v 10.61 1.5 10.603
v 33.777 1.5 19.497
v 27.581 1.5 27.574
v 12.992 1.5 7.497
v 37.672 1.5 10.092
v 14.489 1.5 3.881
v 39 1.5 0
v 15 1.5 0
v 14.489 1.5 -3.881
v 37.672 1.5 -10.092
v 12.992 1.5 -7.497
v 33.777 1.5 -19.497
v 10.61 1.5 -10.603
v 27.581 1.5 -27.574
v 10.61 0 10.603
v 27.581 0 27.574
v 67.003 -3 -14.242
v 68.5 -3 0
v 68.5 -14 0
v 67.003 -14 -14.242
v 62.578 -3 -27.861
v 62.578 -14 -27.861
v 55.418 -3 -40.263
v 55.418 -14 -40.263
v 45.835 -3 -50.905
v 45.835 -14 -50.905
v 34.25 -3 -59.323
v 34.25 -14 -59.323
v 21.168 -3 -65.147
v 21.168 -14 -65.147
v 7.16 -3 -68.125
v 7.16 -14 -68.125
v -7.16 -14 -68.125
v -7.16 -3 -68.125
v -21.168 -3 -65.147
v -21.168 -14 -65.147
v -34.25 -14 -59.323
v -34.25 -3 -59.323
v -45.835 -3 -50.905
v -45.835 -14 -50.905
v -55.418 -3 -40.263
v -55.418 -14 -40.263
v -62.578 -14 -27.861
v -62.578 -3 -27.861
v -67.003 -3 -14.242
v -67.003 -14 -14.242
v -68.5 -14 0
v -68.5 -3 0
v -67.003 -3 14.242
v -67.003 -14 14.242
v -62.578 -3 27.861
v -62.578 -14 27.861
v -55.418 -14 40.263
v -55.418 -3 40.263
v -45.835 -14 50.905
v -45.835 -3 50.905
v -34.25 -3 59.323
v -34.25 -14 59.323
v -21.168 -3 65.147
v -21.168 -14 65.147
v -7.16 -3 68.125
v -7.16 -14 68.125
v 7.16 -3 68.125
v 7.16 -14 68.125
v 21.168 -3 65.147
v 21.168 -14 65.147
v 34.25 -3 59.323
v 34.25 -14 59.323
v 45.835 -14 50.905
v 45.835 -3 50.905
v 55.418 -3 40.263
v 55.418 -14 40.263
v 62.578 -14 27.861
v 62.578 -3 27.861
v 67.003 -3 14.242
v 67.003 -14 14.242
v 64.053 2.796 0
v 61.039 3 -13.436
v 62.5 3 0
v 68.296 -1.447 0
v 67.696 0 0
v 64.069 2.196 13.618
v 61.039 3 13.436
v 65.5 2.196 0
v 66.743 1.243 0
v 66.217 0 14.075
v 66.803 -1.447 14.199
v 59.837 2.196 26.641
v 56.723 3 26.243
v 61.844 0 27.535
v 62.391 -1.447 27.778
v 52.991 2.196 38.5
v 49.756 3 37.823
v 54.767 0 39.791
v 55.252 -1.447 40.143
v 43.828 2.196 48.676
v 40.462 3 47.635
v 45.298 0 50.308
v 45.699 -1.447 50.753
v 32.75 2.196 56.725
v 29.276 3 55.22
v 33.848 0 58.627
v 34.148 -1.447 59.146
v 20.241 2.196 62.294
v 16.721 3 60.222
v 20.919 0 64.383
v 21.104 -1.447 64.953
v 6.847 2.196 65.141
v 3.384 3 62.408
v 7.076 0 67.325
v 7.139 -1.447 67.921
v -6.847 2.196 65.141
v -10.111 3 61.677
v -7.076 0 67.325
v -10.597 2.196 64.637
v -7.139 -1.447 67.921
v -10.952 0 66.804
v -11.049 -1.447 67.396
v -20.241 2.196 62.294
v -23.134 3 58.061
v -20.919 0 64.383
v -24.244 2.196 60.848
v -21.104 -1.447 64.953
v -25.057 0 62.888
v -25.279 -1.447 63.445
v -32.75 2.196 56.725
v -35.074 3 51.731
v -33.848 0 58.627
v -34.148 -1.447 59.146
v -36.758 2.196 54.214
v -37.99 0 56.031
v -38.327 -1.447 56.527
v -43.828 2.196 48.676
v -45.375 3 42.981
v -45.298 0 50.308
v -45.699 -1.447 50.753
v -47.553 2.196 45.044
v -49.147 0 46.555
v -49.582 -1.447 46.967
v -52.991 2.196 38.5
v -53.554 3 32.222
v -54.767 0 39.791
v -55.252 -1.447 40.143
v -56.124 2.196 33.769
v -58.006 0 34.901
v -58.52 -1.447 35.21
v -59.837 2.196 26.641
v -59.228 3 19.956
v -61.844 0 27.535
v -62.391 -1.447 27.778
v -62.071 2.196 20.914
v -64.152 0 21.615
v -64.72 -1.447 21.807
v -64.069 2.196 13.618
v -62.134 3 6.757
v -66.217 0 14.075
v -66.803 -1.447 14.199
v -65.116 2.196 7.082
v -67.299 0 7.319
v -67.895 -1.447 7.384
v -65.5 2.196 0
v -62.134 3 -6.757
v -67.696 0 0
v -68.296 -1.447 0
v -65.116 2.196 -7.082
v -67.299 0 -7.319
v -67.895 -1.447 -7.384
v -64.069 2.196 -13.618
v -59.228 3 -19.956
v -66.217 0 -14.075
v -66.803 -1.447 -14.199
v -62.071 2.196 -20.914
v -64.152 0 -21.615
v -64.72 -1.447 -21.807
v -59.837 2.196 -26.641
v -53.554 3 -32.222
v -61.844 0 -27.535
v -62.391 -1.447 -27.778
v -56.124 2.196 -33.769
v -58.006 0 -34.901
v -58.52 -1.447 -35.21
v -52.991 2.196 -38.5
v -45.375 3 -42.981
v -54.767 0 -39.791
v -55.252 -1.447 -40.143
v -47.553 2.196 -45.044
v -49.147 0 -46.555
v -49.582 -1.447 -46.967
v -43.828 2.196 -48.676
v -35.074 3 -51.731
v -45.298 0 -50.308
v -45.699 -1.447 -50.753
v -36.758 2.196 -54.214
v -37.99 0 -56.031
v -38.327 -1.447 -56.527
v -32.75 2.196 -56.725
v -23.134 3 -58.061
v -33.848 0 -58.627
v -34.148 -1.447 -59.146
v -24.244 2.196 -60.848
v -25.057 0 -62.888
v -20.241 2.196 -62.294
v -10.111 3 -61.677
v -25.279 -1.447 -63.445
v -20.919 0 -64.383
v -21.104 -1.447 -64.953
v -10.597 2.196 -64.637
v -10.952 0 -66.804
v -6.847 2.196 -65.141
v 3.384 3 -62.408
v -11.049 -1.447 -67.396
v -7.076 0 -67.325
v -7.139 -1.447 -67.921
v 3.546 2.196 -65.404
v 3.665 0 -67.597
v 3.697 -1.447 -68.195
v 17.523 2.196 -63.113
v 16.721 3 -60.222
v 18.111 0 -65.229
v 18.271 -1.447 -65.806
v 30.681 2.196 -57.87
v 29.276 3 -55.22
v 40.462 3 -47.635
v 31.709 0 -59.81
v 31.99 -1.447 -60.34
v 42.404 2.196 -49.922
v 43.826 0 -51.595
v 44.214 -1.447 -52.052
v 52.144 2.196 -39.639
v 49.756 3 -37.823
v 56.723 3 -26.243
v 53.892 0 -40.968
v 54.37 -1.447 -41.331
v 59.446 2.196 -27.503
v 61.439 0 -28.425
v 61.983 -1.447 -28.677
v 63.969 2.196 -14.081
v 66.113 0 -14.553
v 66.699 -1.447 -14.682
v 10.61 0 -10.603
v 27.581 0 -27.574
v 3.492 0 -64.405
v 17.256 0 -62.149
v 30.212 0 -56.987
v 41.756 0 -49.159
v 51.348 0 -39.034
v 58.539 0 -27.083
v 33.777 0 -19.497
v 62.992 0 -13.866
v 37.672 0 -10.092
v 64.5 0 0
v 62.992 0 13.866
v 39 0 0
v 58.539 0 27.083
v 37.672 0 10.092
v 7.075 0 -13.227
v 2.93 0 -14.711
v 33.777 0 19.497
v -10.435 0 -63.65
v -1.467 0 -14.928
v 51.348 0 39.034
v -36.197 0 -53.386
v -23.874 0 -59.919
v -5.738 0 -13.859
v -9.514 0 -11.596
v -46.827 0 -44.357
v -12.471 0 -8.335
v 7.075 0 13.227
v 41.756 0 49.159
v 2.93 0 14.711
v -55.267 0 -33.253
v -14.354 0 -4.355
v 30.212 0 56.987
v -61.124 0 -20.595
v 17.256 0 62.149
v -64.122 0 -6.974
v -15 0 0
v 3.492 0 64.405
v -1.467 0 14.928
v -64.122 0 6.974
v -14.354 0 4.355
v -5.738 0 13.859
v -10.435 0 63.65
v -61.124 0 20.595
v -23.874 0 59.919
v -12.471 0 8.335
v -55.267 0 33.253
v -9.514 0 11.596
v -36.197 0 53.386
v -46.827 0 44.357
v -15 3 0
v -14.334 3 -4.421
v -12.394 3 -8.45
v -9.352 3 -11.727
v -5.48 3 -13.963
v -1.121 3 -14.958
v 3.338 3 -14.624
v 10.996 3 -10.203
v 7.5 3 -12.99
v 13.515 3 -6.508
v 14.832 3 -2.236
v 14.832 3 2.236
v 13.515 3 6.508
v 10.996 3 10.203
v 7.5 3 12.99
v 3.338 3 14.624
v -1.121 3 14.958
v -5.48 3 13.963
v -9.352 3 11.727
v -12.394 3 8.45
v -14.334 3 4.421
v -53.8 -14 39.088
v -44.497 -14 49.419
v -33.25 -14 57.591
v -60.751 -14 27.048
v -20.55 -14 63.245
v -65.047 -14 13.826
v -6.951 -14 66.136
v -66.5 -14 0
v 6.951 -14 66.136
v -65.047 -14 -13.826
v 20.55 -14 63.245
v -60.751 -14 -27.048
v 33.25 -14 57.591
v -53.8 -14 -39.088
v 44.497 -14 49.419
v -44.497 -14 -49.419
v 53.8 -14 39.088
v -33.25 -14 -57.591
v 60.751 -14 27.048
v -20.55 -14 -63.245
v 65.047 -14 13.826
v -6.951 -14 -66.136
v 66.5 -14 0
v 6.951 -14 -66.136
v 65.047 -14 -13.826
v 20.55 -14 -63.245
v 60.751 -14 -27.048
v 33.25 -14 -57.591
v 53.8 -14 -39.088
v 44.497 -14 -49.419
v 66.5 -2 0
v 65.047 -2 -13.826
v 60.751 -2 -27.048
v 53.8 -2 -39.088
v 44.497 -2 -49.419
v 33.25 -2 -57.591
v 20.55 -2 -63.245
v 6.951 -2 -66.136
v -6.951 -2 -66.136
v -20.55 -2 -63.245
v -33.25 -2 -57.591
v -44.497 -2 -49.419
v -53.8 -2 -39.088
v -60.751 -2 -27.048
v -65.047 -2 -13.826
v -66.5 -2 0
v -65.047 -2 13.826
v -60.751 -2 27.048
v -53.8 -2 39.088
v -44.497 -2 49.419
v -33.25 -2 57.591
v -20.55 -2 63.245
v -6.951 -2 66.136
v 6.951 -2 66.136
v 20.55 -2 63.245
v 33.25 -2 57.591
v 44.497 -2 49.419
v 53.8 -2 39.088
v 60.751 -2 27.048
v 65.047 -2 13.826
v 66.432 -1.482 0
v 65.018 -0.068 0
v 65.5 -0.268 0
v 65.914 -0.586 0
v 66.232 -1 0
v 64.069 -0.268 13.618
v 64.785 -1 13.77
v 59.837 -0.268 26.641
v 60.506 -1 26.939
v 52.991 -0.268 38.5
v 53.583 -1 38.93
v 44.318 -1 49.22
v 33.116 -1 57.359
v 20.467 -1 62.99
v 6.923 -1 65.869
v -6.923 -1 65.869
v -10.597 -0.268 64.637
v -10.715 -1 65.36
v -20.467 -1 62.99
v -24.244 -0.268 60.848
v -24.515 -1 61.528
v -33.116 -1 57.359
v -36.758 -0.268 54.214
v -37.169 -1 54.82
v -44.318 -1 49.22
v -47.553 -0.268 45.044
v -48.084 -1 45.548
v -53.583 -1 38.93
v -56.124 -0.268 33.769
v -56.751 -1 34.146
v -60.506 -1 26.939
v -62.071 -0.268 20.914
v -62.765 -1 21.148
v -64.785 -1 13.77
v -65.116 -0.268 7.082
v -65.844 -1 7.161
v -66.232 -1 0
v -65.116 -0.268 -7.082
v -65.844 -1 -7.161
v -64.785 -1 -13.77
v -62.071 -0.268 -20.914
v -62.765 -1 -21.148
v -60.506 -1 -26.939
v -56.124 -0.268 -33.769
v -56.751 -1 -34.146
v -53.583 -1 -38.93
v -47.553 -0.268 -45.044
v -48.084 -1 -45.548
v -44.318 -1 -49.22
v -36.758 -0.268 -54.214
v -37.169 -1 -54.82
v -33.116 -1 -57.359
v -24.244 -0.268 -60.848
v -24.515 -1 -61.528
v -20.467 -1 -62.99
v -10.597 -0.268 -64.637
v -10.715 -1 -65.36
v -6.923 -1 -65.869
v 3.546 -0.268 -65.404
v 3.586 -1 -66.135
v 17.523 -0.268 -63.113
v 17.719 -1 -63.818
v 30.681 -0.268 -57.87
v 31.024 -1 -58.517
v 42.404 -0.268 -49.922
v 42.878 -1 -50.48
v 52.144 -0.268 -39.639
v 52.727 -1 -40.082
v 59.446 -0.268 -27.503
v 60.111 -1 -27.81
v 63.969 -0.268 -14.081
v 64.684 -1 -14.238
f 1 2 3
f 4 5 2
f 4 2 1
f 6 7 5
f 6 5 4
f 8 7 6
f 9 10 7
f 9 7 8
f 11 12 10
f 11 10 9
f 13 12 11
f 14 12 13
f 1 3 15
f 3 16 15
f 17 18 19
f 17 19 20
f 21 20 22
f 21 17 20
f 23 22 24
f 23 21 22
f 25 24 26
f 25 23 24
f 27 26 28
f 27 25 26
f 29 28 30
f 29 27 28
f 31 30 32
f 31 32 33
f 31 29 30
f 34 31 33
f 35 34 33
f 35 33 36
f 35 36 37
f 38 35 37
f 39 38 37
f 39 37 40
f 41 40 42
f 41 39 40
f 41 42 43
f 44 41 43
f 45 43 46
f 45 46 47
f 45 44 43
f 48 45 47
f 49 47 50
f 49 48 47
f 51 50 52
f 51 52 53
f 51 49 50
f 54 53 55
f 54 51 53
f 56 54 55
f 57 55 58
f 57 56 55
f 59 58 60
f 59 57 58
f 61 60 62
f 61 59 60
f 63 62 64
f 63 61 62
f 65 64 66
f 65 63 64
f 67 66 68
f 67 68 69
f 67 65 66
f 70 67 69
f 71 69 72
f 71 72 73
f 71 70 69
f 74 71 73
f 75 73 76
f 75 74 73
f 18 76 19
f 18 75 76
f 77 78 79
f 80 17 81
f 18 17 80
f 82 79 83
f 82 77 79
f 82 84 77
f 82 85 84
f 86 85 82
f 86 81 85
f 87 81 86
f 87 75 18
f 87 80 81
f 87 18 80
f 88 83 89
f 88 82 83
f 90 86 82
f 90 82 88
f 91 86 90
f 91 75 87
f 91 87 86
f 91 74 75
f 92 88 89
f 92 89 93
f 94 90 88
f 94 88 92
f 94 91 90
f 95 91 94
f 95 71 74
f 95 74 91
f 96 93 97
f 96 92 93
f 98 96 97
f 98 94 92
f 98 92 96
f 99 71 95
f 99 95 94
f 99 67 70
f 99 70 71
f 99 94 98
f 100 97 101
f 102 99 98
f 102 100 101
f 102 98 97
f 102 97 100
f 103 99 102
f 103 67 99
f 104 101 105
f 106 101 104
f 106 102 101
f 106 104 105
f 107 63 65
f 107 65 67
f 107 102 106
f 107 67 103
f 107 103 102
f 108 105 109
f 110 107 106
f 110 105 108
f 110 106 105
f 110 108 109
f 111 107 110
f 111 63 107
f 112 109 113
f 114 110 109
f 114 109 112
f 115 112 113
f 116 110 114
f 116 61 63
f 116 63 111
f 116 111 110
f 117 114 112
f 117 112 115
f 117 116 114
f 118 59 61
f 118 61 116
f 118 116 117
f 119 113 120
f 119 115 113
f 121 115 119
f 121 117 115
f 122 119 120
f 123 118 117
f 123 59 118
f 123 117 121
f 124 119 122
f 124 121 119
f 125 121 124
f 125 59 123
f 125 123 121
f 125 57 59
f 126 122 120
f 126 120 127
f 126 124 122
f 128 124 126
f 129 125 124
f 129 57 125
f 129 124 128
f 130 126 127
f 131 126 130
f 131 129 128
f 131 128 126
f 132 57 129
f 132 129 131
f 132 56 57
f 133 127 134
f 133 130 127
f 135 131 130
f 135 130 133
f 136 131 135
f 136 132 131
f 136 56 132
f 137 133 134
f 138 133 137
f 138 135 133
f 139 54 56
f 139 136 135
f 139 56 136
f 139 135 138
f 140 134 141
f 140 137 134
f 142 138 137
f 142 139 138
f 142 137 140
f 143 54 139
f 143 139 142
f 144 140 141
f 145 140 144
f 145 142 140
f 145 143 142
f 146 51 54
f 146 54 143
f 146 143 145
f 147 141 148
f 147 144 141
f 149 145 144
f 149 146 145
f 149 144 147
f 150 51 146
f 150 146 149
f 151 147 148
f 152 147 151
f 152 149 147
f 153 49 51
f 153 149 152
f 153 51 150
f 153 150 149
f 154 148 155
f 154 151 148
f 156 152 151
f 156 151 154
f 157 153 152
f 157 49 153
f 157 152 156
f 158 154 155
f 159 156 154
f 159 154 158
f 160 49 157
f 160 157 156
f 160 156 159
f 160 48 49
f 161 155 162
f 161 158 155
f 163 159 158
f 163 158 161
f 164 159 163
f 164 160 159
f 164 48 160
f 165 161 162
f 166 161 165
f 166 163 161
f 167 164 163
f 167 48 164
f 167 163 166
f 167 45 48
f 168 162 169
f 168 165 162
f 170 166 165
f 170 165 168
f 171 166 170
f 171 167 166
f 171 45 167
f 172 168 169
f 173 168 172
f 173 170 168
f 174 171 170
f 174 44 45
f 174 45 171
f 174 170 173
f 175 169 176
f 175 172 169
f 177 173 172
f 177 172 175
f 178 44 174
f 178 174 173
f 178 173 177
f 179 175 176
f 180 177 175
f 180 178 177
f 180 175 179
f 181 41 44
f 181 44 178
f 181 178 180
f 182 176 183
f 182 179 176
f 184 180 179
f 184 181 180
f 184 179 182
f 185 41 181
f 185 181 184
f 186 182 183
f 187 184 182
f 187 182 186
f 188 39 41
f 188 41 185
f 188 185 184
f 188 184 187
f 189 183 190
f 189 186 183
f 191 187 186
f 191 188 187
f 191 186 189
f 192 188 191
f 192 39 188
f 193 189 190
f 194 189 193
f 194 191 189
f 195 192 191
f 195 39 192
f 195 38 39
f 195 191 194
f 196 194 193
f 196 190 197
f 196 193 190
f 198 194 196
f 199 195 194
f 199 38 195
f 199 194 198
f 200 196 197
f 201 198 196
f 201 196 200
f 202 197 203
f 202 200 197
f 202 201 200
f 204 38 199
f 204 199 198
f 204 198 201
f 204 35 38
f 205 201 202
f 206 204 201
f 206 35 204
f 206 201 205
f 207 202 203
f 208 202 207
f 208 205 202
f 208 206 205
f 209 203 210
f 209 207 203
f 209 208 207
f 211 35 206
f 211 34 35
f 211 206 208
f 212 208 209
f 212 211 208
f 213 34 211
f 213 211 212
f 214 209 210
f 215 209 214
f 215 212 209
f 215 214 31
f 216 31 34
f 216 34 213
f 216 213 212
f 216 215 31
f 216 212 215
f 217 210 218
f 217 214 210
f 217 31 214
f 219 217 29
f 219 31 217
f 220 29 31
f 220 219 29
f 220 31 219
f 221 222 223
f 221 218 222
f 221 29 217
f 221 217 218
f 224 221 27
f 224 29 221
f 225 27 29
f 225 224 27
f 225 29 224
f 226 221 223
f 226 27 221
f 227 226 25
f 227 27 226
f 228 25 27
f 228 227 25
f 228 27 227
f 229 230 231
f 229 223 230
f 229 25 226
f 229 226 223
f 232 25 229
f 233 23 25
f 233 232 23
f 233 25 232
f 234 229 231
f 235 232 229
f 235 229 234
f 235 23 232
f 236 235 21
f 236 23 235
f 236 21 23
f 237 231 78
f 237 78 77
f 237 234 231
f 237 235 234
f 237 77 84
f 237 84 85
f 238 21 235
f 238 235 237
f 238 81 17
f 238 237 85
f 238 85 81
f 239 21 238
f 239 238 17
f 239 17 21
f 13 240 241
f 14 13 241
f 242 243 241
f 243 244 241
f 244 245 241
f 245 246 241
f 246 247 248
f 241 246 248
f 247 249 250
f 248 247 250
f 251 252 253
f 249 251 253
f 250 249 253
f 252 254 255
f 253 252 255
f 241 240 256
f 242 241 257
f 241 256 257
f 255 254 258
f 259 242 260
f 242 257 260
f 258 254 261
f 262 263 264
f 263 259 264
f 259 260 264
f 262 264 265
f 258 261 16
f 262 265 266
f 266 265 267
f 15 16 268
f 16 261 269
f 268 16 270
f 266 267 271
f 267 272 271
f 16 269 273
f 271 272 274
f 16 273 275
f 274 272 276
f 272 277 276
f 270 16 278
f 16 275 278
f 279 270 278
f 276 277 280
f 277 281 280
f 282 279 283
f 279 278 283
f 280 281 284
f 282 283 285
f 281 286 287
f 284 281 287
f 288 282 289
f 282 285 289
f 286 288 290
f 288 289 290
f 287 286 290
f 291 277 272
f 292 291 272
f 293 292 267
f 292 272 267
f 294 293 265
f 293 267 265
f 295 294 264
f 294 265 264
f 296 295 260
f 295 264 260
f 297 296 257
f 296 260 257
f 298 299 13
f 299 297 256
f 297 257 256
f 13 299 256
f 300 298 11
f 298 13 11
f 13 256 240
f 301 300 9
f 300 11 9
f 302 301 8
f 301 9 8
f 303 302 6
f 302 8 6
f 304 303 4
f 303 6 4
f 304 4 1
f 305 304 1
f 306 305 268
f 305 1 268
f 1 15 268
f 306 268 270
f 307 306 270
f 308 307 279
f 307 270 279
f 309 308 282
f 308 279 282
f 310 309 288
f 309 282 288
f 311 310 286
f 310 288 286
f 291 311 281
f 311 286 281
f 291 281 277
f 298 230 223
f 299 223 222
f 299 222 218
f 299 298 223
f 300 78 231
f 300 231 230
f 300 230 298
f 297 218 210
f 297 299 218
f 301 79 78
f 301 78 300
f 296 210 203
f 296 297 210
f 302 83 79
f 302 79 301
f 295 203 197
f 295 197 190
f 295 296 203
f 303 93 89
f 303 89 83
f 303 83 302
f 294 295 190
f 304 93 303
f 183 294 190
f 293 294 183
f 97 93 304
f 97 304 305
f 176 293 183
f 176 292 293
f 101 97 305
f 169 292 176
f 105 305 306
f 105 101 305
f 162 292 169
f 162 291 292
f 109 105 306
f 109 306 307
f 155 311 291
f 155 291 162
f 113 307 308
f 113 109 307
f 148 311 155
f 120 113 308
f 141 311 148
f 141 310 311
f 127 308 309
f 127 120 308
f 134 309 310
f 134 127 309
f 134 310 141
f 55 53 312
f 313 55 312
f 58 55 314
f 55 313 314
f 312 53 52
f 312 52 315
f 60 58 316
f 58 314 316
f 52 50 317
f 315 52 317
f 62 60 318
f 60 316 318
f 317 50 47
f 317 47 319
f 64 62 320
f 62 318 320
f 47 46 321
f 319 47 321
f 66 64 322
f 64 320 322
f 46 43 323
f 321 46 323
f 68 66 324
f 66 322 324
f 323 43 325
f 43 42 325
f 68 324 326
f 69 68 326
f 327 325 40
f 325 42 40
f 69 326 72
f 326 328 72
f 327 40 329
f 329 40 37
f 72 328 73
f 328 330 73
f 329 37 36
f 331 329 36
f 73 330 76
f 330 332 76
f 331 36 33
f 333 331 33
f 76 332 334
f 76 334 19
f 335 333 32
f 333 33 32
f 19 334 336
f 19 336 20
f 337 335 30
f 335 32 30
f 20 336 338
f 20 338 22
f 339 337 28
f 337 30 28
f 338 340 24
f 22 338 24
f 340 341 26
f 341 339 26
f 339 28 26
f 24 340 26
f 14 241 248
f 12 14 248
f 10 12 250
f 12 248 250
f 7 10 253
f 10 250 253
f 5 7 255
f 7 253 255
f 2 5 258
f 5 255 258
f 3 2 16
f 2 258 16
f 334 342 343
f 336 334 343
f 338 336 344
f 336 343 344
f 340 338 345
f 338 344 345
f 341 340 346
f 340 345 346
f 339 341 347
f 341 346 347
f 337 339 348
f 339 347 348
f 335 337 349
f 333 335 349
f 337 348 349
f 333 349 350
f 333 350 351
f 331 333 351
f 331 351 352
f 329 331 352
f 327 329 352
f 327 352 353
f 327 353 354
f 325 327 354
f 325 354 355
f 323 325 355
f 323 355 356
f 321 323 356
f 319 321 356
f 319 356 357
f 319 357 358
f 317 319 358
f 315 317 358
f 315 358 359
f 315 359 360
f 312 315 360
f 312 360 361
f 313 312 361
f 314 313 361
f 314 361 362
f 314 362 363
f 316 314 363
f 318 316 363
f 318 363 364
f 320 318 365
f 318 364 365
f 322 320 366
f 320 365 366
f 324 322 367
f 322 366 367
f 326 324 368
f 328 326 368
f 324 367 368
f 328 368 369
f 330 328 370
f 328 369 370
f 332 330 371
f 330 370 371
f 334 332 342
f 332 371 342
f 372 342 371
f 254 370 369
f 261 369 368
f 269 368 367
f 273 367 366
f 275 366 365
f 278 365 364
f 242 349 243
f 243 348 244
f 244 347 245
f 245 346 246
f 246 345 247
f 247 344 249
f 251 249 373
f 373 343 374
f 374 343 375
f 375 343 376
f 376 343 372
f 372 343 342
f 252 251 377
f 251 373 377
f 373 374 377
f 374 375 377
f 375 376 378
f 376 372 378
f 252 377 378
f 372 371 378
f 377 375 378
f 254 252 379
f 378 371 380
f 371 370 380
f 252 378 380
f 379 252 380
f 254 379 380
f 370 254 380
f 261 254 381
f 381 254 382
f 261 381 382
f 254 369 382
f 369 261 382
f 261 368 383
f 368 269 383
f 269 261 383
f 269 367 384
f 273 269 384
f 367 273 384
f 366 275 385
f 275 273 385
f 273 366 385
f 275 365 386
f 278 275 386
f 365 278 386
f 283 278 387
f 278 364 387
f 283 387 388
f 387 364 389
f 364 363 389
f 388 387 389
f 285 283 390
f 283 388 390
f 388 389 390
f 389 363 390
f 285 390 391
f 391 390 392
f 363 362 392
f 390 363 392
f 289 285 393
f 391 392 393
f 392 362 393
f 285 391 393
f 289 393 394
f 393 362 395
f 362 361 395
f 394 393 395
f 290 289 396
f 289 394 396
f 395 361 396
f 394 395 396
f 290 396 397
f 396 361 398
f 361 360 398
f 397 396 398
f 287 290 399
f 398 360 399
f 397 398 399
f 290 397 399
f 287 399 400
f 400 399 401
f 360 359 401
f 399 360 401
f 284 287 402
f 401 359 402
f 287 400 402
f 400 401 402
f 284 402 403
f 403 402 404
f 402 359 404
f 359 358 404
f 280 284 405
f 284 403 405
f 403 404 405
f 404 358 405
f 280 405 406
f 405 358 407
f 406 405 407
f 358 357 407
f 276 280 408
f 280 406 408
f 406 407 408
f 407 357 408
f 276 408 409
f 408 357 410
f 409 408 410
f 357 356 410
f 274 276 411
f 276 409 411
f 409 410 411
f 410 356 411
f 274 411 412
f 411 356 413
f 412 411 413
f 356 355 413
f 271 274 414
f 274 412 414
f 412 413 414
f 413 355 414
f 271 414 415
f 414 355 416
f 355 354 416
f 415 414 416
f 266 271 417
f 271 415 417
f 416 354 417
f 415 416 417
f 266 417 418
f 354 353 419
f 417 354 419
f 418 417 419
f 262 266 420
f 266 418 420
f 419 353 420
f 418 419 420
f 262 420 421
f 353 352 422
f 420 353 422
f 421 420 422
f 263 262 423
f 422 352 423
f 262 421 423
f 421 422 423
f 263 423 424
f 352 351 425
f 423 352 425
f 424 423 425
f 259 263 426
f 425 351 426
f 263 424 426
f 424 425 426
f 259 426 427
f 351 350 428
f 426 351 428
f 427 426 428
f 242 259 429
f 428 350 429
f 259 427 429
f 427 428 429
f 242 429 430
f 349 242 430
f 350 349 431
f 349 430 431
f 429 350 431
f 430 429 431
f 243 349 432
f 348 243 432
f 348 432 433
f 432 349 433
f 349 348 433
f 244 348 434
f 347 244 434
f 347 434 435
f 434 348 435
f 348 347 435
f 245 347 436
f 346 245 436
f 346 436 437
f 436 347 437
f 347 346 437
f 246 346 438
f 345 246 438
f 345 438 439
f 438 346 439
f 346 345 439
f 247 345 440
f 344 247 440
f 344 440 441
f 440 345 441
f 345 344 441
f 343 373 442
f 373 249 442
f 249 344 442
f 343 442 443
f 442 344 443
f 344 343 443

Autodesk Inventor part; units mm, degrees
ref_plane "YZ Plane" through (0, 0, 0) normal (1, 0, 0) x (0, 1, 0)
ref_plane "XZ Plane" through (0, 0, 0) normal (0, 1, 0) x (-1, 0, 0)
ref_plane "XY Plane" through (0, 0, 0) normal (0, 0, 1) x (1, 0, 0)
sketch "Sketch1" plane through (0, 0, 0) normal (0, 1, 0) x (-1, 0, 0)
  circle A0 centre (0, 0) radius 66.5
  circle A1 centre (0, 0) radius 15
  dimension "d0" = 133
  dimension "d3" = 30
extrude "Extrusion2" add sketch "Sketch1" along normal blind 3
sketch "Sketch3" plane through (0, 3, 0) normal (0, 1, 0) x (1, 0, 0)
  circle A0 centre (0, 0) radius 66.5
  circle A1 centre (0, 0) radius 68.5
  dimension "d6" = 133
  dimension "d7" = 137
extrude "Extrusion3" add sketch "Sketch3" against normal blind 17
sketch "Sketch4" plane through (0, 0, 0) normal (0, -1, 0) x (1, 0, 0)
  circle A0 centre (0, 0) radius 15
  circle A1 centre (0, 0) radius 39
  line L0 (10.6103, -10.6029) -> (27.5808, -27.5735)
  line L1 (39, 0) -> (15, 0)
  circle A2 centre (0, 0) radius 15 projected
  line L2 (27.7885, -27.3642) -> (10.8166, -10.3923)
  dimension "d10" = 30
  dimension "d11" = 24
extrude "Extrusion4" cut sketch "Sketch4" against normal blind 1.5 contours L1 A1 L2 A0 | A0 L2 A1 L0
mirror "Mirror1" about plane through (0, 0, 0) normal (0, 0, 1) of "Extrusion4"
fillet "Fillet1" radius 6 1 edges at (-68.5, 3, 0)
fillet "Fillet2" radius 2 1 edges at (-66.5, 0, 0)
properties part number "DireccionBase"
